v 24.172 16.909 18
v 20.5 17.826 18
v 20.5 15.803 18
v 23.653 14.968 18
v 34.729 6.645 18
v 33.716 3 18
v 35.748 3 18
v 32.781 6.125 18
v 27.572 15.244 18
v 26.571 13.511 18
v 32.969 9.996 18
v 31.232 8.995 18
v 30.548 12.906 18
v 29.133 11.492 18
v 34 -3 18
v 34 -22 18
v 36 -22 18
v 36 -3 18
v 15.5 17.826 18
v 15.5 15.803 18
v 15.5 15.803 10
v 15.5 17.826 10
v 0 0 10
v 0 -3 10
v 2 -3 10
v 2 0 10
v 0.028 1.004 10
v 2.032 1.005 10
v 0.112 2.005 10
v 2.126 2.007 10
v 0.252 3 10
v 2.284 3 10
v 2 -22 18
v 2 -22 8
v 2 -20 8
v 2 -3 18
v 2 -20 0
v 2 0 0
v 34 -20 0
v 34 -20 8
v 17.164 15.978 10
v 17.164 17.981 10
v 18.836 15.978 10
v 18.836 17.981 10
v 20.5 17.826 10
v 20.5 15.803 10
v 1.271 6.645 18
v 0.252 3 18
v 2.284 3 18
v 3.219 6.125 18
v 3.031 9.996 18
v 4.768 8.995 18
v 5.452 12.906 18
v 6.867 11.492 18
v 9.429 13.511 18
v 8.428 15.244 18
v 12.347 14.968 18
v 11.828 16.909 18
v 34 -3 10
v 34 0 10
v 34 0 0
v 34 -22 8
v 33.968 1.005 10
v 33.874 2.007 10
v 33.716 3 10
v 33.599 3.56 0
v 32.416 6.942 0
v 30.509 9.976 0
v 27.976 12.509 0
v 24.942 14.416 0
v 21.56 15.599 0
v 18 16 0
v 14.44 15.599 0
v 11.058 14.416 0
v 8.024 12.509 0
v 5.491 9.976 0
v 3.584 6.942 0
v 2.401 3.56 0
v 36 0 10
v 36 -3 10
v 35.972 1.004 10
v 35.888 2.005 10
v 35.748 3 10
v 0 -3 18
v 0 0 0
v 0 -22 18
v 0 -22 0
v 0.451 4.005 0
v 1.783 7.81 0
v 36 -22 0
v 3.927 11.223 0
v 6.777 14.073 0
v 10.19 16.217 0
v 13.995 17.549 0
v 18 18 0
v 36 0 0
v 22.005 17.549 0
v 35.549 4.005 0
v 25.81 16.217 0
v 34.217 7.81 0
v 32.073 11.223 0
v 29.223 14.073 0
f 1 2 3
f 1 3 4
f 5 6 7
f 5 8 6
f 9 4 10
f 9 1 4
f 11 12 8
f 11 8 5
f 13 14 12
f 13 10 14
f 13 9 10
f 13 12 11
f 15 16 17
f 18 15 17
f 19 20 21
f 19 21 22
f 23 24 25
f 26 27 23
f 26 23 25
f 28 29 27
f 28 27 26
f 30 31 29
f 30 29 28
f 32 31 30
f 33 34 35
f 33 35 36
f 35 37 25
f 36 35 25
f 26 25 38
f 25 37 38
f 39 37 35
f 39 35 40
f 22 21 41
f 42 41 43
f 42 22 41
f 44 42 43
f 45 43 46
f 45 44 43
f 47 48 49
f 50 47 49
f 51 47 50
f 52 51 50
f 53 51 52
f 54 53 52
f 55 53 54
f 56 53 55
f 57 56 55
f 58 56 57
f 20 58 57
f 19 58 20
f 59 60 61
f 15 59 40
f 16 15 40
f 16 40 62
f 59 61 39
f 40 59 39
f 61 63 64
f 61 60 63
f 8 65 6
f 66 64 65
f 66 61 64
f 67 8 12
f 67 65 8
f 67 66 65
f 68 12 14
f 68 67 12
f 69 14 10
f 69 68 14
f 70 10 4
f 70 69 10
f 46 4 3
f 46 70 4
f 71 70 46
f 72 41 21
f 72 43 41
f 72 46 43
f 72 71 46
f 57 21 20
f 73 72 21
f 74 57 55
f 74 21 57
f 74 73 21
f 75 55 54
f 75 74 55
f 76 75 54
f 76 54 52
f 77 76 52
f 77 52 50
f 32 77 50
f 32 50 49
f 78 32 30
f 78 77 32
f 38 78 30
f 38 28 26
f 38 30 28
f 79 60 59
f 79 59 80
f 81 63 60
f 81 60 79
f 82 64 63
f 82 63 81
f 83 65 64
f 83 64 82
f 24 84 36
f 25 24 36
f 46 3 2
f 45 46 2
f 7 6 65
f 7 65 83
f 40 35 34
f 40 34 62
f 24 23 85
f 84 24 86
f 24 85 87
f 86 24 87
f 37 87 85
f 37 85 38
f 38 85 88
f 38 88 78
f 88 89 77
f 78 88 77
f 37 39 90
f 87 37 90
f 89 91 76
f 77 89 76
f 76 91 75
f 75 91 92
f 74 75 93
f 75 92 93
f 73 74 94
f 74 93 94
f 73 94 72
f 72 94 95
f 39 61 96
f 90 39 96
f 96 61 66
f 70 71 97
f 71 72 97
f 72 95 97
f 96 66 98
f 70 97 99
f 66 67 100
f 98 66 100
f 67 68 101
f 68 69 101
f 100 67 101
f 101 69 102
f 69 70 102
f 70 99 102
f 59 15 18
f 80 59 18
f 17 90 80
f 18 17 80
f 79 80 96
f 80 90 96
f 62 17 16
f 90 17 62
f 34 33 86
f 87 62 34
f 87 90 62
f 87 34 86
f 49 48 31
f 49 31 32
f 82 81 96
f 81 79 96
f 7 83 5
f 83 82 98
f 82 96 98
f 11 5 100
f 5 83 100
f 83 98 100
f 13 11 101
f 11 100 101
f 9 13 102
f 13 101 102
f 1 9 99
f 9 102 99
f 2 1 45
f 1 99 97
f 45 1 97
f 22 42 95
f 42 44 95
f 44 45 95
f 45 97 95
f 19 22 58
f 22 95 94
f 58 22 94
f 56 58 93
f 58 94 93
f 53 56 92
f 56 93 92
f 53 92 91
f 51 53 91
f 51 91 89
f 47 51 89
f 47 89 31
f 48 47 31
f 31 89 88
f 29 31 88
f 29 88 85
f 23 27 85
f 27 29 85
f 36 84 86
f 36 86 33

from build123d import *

# Parameters (mm, degrees)
PAD048_DEPTH    = 18
SKETCH114_W     = 32
SKETCH114_H     = 2
POCKET042_DEPTH = 10
SKETCH158_W     = 5
SKETCH158_H     = 5
SKETCH158_W_2   = 3
SKETCH158_H_2   = 6
POCKET062_DEPTH = 8


with BuildPart() as part:
    # Sketch085 → Pad048 (new body)
    with BuildSketch(Plane.XY):
        with BuildLine():
            ThreePointArc((36, 0), (18, 18), (0, 0))
            Line((0, 0), (0, -22))
            Line((36, -22), (0, -22))
            Line((36, -22), (36, 0))
        make_face()
        with BuildLine():
            ThreePointArc((34, 0), (18, 16), (2, 0))
            Line((2, -20), (2, 0))
            Line((2, -20), (34, -20))
            Line((34, 0), (34, -20))
        make_face(mode=Mode.SUBTRACT)
    extrude(amount=PAD048_DEPTH)

    # Sketch114 (on Face10 of Pad048) → Pocket042 (cut)
    with BuildSketch(Plane.XY.offset(18)):
        with Locations((18, -21)):
            Rectangle(SKETCH114_W, SKETCH114_H)
    extrude(amount=-POCKET042_DEPTH, mode=Mode.SUBTRACT)

    # Sketch158 (on Face5 of Pocket042) → Pocket062 (cut)
    with BuildSketch(Plane.XY.offset(18)):
        with Locations((18, 16.678012)):
            Rectangle(SKETCH158_W, SKETCH158_H)
        with Locations((1.5, 0)):
            Rectangle(SKETCH158_W_2, SKETCH158_H_2)
        with Locations((34.5, 0)):
            Rectangle(SKETCH158_W_2, SKETCH158_H_2)
    extrude(amount=-POCKET062_DEPTH, mode=Mode.SUBTRACT)


solid = part.part
